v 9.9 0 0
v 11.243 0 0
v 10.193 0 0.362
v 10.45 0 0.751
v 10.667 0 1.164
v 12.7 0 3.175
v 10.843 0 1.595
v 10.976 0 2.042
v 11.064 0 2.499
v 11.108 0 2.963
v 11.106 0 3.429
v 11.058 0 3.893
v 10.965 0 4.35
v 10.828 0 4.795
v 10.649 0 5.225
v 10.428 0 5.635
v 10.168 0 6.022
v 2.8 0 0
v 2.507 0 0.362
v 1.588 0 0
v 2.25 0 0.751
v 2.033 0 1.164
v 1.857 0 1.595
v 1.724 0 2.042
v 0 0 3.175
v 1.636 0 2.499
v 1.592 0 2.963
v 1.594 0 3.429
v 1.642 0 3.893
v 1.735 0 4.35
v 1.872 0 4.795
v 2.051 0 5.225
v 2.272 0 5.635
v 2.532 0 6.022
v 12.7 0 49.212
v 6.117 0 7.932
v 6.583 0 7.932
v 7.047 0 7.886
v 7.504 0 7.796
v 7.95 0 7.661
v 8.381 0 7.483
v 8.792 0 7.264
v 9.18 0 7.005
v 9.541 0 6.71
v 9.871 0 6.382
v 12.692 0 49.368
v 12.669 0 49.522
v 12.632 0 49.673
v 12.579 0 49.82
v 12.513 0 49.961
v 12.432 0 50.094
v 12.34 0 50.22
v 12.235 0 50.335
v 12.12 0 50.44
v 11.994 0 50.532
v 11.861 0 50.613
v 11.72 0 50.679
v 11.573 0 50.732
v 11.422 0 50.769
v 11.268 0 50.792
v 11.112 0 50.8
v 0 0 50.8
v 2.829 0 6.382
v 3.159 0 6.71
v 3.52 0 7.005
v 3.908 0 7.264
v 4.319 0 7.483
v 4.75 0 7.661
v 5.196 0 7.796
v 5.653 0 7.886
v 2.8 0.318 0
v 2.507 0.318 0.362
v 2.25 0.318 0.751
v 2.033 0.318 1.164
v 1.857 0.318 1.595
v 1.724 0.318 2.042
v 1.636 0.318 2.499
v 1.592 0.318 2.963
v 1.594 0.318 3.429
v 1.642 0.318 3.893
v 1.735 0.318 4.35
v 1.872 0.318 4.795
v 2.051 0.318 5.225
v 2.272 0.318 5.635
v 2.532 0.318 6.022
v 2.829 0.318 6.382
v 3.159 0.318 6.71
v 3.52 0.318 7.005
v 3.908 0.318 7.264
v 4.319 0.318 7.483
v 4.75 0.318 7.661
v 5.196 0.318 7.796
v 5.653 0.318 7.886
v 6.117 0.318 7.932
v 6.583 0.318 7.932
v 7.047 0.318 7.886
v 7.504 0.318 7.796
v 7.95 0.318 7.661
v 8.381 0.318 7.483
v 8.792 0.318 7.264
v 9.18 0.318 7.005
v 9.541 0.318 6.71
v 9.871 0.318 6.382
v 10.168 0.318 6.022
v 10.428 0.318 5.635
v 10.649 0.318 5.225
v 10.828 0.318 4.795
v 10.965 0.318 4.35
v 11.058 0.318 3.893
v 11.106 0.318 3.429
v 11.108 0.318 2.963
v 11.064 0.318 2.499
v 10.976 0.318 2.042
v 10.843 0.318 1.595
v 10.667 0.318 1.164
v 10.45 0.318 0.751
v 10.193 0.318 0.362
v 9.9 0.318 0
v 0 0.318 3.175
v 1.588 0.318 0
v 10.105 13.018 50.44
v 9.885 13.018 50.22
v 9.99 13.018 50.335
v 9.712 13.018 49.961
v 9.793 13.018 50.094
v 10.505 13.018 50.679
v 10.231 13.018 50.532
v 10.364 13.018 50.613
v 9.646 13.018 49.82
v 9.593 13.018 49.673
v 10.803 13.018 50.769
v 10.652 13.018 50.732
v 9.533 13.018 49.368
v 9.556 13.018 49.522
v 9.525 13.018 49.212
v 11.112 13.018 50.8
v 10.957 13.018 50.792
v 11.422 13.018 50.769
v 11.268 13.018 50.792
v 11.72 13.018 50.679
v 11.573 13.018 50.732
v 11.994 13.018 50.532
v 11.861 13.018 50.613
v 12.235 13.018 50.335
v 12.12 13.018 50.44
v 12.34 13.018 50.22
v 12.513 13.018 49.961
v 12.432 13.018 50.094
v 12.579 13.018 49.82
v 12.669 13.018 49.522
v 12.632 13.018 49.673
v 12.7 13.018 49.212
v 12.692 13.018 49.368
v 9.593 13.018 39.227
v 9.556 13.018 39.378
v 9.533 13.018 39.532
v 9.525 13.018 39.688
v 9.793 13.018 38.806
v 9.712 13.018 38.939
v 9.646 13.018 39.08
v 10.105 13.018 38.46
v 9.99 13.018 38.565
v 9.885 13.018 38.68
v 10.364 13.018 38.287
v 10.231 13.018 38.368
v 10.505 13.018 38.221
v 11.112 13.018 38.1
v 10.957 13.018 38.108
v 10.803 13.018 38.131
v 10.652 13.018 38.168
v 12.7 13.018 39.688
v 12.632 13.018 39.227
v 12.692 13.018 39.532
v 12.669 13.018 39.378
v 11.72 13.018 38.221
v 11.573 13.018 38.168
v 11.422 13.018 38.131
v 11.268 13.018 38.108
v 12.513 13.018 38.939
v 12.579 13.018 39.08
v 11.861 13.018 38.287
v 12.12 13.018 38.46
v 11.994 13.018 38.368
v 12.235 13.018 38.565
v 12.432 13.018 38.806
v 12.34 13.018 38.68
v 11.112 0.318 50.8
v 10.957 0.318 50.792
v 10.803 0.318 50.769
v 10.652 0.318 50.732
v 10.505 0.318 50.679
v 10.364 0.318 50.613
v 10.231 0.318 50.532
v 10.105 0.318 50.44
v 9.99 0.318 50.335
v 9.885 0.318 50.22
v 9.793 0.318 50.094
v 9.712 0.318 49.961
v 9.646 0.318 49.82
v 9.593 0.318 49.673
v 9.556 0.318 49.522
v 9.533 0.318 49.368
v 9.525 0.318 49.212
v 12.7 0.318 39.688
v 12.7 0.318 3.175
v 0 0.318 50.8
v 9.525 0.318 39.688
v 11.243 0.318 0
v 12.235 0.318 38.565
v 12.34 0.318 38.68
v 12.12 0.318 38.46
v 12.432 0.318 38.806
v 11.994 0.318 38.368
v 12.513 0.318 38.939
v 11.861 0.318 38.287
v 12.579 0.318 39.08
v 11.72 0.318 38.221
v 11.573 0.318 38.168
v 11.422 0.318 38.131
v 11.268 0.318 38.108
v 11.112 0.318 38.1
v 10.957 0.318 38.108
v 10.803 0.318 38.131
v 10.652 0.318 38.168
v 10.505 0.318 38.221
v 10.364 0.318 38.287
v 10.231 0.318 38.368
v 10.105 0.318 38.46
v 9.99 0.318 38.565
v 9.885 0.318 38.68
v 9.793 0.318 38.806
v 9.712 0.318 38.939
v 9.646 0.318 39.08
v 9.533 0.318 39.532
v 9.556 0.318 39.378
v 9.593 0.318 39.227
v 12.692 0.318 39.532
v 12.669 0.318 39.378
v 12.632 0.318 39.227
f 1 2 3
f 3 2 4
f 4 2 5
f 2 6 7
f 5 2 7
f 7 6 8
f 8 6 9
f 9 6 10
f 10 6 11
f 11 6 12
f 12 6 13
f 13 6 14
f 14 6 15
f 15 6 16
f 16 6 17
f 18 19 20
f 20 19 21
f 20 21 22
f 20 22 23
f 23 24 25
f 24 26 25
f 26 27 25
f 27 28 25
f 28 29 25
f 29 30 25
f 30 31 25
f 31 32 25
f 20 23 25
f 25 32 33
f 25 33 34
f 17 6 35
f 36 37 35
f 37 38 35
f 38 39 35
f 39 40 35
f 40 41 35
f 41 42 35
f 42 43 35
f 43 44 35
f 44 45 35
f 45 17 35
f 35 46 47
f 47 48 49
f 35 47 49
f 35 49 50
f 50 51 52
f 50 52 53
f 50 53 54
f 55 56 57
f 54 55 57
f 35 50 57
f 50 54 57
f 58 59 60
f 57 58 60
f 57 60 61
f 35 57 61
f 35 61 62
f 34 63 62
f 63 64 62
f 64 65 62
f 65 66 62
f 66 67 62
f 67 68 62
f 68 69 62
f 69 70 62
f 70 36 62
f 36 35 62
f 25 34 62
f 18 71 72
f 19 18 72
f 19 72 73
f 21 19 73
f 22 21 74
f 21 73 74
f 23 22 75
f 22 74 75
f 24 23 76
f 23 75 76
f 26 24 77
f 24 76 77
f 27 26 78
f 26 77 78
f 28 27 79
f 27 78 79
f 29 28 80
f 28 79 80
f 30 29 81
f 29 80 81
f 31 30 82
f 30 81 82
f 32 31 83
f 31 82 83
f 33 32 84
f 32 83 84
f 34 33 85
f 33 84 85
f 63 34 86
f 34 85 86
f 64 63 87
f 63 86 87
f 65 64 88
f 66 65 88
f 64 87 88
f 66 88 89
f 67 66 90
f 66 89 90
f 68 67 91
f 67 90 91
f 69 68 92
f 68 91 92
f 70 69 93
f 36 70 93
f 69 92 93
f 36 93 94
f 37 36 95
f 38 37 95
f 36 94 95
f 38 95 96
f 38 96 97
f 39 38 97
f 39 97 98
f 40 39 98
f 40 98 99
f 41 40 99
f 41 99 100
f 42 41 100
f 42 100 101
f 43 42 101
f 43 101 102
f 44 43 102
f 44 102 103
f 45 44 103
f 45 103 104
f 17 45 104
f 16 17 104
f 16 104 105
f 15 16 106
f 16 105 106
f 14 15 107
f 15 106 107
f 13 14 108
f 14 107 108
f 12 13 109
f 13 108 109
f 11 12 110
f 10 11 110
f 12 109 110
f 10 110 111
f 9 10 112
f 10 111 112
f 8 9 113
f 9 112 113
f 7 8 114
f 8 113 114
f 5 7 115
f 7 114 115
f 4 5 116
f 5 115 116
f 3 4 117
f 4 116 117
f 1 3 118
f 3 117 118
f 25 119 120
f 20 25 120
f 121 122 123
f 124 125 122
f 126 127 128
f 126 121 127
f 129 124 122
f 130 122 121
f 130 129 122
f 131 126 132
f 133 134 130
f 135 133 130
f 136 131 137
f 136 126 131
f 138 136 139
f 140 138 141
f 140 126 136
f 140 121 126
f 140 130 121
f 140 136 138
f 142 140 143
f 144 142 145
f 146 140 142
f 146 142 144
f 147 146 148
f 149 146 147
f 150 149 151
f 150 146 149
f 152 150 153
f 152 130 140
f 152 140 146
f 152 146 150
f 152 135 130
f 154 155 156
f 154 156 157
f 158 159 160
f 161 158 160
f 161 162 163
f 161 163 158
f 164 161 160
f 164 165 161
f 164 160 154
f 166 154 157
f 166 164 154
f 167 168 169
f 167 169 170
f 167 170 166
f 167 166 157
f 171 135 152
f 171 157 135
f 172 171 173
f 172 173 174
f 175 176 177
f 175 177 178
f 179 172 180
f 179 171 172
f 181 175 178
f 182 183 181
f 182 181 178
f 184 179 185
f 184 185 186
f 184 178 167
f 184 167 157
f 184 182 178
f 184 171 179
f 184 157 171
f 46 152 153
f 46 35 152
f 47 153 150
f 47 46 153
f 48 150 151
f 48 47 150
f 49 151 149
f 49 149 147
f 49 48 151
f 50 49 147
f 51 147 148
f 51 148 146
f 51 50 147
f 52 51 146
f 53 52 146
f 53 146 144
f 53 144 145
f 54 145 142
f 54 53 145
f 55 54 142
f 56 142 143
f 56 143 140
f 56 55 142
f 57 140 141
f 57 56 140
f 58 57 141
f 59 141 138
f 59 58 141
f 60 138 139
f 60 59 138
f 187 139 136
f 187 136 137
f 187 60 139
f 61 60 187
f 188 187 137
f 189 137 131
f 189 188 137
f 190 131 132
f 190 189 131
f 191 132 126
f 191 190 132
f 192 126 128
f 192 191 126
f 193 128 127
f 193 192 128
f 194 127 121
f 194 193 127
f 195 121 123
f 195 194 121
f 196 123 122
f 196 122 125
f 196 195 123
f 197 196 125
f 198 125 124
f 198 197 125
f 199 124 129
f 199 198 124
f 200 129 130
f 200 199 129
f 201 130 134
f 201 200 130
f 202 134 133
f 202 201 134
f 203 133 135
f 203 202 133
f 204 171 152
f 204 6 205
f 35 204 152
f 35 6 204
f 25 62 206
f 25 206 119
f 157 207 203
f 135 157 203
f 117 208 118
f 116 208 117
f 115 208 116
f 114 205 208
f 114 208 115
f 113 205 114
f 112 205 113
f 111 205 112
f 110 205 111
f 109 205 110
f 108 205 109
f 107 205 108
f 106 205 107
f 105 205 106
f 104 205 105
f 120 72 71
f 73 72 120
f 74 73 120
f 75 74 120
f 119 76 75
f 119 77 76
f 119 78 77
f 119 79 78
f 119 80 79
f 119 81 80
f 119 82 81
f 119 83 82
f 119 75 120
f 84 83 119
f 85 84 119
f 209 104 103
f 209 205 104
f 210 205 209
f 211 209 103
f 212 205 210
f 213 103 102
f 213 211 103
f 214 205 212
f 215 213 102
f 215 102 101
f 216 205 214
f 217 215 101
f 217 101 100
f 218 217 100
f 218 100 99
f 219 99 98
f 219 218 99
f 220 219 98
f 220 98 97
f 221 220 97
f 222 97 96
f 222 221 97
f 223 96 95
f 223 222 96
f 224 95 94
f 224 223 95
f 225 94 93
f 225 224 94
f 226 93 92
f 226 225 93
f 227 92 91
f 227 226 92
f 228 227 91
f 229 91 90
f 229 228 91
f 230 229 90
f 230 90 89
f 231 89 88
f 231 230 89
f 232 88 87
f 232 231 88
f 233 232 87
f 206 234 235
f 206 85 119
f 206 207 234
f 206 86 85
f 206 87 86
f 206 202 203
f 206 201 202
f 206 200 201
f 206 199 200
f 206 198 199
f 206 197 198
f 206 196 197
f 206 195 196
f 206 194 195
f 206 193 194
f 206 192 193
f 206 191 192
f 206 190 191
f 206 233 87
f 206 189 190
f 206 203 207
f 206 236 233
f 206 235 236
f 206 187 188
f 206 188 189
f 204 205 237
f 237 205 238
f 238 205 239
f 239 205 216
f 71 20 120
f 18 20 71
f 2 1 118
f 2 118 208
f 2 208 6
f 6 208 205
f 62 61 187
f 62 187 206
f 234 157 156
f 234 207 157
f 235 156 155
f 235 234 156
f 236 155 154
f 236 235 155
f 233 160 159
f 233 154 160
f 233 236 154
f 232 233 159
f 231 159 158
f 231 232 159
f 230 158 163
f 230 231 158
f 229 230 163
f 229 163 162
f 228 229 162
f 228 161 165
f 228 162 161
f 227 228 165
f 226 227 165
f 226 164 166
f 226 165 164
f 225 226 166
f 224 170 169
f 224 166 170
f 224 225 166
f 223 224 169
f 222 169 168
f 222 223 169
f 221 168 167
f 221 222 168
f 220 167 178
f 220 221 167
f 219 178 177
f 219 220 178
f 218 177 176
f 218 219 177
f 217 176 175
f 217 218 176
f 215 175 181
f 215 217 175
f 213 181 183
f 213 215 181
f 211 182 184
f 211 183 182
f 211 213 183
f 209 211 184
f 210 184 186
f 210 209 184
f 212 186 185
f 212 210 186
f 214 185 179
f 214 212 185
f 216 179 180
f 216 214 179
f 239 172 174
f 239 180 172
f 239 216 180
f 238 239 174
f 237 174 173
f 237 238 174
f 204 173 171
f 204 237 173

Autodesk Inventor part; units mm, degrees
ref_plane "YZ Plane" through (0, 0, 0) normal (1, 0, 0) x (0, 1, 0)
ref_plane "XZ Plane" through (0, 0, 0) normal (0, 1, 0) x (-1, 0, 0)
ref_plane "XY Plane" through (0, 0, 0) normal (0, 0, 1) x (1, 0, 0)
sketch "Sketch1" plane through (0, 0, 0) normal (0, 1, 0) x (-1, 0, 0)
  line L0 (0, 0) -> (-12.7, 0)
  line L1 (-12.7, 0) -> (-12.7, 50.8)
  line L2 (-12.7, 50.8) -> (0, 50.8)
  line L3 (0, 50.8) -> (0, 0)
  circle A0 centre (-6.35, 3.175) radius 4.7625
  point P0 (-1.5875, 0)
  point P1 (-11.1125, 0)
  dimension "d1" = 12.7
  dimension "d4" = 50.8
  dimension "d11" = 9.525
  dimension "d12" = 3.175
  dimension "d13" = 6.35
extrude "Extrusion1" add sketch "Sketch1" along normal blind 0.3175 contours L0 A0 L1 L2 L3 | L0 A0 picked at (-5.1617, 2.7426)
sketch "Sketch2" plane through (0, 0.3175, 0) normal (0, 1, 0) x (1, 0, 0)
  line L0 (11.1125, -49.2125) -> (11.1125, -39.6875) construction
  line L1 (12.7, -49.2125) -> (12.7, -39.6875)
  line L2 (9.525, -39.6875) -> (9.525, -49.2125)
  arc A0 (9.525, -49.2125) -> (12.7, -49.2125) centre (11.1125, -49.2125) ccw
  arc A1 (12.7, -39.6875) -> (9.525, -39.6875) centre (11.1125, -39.6875) ccw
  line L3 (0, -50.8) -> (12.7, -50.8) projected
  point P0 (0, 0)
  point P1 (11.1125, -44.45)
  dimension "d23" = 1.5875
  dimension "d24" = 1.5875
  dimension "d25" = 9.525
extrude "Extrusion2" add sketch "Sketch2" along normal blind 12.7
sketch "Sketch3" plane through (0, 0.3175, 0) normal (0, 1, 0) x (1, 0, 0)
  line L0 (12.7, -50.8) -> (0, -50.8) projected
  line L1 (12.7, 0) -> (12.7, -50.8) projected
  line L2 (11.1125, -50.8) -> (12.7, -50.8)
  line L3 (12.7, -50.8) -> (12.7, -49.2125)
  arc A0 (11.1125, -50.8) -> (12.7, -49.2125) centre (11.1125, -49.2125) ccw
  point P0 (0, 0)
extrude "Extrusion3" cut sketch "Sketch3" against normal blind 12.7
sketch "Sketch4" plane through (0, 0.3175, 0) normal (0, 1, 0) x (1, 0, 0)
  circle A0 centre (6.35, -3.175) radius 4.7625
  line L0 (12.7, -39.6875) -> (12.7, 0) projected
  line L1 (12.7, 0) -> (0, 0) projected
  dimension "d14" = 9.525
  dimension "d15" = 6.35
  dimension "d16" = 3.175
extrude "Extrusion4" cut sketch "Sketch4" against normal blind 12.7
sketch "Sketch5" plane through (0, 0.3175, 0) normal (0, 1, 0) x (1, 0, 0)
  line L0 (0, -3.175) -> (1.5875, 0)
  line L1 (2.8002, 0) -> (0, 0) projected
  line L2 (0, -50.8) -> (0, 0) projected
  line L3 (0, -3.175) -> (0, 0)
  line L4 (0, 0) -> (1.5875, 0)
extrude "Extrusion5" cut sketch "Sketch5" against normal blind 12.7
sketch "Sketch6" plane through (0, 0.3175, 0) normal (0, 1, 0) x (1, 0, 0)
  line L0 (11.2433, 0) -> (12.7, -3.175)
  line L1 (12.7, -39.6875) -> (12.7, 0) projected
  line L2 (12.7, -3.175) -> (12.7, 0)
  line L3 (12.7, 0) -> (11.2433, 0)
  line L4 (12.7, 0) -> (9.8998, 0) projected
  point P0 (0, 0)
extrude "Extrusion6" cut sketch "Sketch6" against normal blind 12.7
properties part number "piston locking tool"
